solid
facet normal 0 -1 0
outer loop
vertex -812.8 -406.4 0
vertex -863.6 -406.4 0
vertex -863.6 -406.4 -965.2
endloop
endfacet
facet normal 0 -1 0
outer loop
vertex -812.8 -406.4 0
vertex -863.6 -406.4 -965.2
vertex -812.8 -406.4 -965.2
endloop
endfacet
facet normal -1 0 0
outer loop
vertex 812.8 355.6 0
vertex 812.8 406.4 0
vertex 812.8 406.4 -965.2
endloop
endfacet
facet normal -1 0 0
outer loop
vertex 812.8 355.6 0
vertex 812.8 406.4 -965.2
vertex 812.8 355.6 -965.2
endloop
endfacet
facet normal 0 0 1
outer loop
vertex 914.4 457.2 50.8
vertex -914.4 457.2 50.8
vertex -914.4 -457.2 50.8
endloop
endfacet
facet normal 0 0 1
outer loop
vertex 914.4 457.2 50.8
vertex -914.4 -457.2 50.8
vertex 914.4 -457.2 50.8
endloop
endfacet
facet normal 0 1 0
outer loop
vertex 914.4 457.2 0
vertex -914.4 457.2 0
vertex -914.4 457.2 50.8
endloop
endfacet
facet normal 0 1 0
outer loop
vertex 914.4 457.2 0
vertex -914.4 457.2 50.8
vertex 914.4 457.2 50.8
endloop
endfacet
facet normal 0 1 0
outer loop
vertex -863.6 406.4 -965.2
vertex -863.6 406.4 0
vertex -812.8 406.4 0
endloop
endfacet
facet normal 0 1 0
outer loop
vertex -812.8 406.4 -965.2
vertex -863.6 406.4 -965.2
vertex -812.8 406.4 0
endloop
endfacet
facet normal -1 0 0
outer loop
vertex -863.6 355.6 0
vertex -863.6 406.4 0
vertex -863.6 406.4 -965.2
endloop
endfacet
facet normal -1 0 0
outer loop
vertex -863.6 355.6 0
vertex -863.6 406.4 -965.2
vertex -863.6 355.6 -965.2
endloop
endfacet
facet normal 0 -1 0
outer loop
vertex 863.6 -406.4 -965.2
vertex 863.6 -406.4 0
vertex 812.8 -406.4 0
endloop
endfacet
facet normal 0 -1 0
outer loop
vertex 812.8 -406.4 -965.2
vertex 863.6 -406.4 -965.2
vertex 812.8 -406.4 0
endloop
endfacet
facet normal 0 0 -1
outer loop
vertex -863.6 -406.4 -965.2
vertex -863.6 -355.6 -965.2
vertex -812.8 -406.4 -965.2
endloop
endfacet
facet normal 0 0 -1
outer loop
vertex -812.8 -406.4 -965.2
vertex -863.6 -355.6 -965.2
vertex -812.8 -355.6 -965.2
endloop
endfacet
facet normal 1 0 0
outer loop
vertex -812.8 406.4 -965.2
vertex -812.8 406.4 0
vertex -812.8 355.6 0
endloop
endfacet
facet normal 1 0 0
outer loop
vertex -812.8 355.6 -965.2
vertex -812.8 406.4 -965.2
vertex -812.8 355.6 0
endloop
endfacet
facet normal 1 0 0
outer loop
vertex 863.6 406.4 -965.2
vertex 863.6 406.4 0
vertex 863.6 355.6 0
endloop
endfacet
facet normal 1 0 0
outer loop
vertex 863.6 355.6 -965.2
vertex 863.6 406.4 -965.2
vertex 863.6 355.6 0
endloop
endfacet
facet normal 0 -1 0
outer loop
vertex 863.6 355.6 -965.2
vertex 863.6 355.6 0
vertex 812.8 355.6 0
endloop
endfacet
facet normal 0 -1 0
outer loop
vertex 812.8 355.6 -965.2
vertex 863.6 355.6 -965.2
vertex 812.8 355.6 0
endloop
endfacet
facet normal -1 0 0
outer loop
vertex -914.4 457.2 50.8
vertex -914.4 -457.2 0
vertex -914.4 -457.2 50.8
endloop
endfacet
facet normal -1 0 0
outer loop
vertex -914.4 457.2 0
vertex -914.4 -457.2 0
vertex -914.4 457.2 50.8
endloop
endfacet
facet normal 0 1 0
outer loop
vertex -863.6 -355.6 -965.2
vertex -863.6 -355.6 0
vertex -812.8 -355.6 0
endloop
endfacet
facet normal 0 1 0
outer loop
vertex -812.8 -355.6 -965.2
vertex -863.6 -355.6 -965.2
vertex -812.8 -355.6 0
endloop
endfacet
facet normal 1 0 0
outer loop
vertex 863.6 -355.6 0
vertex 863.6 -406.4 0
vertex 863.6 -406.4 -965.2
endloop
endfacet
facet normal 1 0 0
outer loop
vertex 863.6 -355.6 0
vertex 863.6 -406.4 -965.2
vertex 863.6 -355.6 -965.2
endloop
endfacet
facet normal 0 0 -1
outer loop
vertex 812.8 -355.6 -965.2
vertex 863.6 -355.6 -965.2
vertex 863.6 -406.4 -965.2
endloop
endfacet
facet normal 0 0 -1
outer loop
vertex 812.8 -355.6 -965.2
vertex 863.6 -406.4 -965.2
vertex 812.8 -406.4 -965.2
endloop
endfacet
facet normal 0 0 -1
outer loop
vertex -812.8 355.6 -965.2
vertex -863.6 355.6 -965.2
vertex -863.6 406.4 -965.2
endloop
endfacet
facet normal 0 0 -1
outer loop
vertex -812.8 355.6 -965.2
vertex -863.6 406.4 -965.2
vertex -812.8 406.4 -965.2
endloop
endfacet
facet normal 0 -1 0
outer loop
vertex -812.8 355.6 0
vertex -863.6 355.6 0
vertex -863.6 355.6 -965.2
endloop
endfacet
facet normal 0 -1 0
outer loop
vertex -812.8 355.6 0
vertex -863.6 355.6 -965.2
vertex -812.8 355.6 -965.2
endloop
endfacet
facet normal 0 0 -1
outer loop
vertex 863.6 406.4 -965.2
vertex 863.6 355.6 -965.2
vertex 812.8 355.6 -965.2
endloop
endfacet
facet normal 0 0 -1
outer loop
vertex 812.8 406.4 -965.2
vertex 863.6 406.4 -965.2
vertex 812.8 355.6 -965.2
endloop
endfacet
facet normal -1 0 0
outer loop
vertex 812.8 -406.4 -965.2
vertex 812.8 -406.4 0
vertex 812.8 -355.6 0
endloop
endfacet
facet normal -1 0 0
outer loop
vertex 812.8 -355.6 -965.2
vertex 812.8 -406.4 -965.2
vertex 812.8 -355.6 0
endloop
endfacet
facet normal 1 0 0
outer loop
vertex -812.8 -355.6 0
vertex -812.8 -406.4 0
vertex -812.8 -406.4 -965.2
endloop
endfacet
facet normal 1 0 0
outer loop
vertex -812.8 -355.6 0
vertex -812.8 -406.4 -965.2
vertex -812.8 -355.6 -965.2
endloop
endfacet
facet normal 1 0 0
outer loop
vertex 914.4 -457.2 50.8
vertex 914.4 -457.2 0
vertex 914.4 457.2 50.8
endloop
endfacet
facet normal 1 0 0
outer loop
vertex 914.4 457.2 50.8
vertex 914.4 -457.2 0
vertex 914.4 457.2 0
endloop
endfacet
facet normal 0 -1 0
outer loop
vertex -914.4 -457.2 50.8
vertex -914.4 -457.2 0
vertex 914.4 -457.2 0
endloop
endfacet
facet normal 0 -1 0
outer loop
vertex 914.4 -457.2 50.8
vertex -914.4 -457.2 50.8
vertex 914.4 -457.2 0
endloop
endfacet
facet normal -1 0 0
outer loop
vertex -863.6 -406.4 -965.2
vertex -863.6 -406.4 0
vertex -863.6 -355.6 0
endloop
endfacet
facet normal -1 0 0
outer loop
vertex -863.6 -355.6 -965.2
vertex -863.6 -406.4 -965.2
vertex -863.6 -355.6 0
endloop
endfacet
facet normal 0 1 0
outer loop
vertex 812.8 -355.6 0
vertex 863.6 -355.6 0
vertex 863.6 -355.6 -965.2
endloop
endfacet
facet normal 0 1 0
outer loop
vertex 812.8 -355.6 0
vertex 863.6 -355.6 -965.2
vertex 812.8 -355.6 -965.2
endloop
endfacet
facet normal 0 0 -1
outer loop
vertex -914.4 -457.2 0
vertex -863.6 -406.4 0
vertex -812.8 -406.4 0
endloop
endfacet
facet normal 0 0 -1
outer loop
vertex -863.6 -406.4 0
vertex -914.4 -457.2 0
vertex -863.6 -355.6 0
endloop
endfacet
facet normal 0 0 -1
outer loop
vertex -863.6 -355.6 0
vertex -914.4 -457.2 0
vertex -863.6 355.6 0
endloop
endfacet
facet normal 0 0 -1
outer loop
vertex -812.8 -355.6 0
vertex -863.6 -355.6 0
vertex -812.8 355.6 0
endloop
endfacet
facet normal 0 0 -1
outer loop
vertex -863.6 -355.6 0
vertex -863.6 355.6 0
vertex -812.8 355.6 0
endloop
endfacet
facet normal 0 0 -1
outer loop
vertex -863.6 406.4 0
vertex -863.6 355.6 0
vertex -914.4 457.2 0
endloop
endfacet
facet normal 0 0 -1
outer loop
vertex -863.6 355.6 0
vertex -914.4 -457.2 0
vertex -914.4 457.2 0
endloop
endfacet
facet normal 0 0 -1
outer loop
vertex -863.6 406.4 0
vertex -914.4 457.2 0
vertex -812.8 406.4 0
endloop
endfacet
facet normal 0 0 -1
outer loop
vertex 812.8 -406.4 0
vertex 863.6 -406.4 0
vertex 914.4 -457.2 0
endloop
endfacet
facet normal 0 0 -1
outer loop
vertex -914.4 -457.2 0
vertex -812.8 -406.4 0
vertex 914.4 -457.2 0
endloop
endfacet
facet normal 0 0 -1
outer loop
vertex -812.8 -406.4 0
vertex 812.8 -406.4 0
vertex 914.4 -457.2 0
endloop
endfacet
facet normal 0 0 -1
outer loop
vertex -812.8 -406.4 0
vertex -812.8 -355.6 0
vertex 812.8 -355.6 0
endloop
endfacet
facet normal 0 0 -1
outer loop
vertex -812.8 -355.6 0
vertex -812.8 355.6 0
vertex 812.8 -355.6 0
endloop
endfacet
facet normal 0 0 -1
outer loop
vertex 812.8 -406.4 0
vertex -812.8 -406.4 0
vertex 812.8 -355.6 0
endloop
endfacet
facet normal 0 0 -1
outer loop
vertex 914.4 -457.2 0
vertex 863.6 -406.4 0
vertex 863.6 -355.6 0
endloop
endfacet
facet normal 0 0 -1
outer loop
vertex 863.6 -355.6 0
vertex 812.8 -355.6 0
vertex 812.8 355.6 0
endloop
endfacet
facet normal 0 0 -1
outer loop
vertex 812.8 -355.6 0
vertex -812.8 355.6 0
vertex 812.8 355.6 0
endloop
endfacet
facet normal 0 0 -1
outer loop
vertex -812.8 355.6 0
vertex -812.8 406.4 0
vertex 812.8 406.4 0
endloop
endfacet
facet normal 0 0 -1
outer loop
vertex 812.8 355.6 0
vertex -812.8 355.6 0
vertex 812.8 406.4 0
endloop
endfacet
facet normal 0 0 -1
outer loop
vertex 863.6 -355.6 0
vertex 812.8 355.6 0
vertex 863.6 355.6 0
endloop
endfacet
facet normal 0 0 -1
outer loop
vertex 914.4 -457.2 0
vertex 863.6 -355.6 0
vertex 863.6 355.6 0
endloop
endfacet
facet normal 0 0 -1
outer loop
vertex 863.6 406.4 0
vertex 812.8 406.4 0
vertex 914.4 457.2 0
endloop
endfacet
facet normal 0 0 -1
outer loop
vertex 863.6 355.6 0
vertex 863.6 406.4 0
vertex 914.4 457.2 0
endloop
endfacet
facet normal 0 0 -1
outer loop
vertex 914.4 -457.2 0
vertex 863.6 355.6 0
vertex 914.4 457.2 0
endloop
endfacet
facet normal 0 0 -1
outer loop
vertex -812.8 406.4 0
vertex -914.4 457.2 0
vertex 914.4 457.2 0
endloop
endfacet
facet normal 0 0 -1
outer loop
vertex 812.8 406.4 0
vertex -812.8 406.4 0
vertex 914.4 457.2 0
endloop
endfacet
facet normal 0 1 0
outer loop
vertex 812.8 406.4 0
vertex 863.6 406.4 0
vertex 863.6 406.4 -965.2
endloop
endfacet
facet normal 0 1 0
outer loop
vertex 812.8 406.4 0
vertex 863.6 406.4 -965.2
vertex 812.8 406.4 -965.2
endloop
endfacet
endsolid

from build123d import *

# Parameters (mm, degrees)
F0_W     = 1828.8
F0_H     = 914.4
F1_DEPTH = 50.8
F2_W     = 50.8
F2_H     = 50.8
F3_DEPTH = 1016


with BuildPart() as f1:
    # F0 (on Top) → F1 (new body)
    with BuildSketch(Plane.XY):
        Rectangle(F0_W, F0_H)
    extrude(amount=F1_DEPTH)

    # F2 (on face) → F3 (join)
    with BuildSketch(Plane.XY.offset(50.8)):
        with Locations((-838.2, -381)):
            Rectangle(F2_W, F2_H)
    extrude(amount=-F3_DEPTH)

    # F4: F1 across plane


with BuildPart() as f1_1:
    add(f1.part)
    add(f1.part.mirror(Plane.XZ))

    # F5: F1 across plane


with BuildPart() as f1_2:
    add(f1_1.part)
    add(f1_1.part.mirror(Plane.YZ))


solid = f1_2.part
